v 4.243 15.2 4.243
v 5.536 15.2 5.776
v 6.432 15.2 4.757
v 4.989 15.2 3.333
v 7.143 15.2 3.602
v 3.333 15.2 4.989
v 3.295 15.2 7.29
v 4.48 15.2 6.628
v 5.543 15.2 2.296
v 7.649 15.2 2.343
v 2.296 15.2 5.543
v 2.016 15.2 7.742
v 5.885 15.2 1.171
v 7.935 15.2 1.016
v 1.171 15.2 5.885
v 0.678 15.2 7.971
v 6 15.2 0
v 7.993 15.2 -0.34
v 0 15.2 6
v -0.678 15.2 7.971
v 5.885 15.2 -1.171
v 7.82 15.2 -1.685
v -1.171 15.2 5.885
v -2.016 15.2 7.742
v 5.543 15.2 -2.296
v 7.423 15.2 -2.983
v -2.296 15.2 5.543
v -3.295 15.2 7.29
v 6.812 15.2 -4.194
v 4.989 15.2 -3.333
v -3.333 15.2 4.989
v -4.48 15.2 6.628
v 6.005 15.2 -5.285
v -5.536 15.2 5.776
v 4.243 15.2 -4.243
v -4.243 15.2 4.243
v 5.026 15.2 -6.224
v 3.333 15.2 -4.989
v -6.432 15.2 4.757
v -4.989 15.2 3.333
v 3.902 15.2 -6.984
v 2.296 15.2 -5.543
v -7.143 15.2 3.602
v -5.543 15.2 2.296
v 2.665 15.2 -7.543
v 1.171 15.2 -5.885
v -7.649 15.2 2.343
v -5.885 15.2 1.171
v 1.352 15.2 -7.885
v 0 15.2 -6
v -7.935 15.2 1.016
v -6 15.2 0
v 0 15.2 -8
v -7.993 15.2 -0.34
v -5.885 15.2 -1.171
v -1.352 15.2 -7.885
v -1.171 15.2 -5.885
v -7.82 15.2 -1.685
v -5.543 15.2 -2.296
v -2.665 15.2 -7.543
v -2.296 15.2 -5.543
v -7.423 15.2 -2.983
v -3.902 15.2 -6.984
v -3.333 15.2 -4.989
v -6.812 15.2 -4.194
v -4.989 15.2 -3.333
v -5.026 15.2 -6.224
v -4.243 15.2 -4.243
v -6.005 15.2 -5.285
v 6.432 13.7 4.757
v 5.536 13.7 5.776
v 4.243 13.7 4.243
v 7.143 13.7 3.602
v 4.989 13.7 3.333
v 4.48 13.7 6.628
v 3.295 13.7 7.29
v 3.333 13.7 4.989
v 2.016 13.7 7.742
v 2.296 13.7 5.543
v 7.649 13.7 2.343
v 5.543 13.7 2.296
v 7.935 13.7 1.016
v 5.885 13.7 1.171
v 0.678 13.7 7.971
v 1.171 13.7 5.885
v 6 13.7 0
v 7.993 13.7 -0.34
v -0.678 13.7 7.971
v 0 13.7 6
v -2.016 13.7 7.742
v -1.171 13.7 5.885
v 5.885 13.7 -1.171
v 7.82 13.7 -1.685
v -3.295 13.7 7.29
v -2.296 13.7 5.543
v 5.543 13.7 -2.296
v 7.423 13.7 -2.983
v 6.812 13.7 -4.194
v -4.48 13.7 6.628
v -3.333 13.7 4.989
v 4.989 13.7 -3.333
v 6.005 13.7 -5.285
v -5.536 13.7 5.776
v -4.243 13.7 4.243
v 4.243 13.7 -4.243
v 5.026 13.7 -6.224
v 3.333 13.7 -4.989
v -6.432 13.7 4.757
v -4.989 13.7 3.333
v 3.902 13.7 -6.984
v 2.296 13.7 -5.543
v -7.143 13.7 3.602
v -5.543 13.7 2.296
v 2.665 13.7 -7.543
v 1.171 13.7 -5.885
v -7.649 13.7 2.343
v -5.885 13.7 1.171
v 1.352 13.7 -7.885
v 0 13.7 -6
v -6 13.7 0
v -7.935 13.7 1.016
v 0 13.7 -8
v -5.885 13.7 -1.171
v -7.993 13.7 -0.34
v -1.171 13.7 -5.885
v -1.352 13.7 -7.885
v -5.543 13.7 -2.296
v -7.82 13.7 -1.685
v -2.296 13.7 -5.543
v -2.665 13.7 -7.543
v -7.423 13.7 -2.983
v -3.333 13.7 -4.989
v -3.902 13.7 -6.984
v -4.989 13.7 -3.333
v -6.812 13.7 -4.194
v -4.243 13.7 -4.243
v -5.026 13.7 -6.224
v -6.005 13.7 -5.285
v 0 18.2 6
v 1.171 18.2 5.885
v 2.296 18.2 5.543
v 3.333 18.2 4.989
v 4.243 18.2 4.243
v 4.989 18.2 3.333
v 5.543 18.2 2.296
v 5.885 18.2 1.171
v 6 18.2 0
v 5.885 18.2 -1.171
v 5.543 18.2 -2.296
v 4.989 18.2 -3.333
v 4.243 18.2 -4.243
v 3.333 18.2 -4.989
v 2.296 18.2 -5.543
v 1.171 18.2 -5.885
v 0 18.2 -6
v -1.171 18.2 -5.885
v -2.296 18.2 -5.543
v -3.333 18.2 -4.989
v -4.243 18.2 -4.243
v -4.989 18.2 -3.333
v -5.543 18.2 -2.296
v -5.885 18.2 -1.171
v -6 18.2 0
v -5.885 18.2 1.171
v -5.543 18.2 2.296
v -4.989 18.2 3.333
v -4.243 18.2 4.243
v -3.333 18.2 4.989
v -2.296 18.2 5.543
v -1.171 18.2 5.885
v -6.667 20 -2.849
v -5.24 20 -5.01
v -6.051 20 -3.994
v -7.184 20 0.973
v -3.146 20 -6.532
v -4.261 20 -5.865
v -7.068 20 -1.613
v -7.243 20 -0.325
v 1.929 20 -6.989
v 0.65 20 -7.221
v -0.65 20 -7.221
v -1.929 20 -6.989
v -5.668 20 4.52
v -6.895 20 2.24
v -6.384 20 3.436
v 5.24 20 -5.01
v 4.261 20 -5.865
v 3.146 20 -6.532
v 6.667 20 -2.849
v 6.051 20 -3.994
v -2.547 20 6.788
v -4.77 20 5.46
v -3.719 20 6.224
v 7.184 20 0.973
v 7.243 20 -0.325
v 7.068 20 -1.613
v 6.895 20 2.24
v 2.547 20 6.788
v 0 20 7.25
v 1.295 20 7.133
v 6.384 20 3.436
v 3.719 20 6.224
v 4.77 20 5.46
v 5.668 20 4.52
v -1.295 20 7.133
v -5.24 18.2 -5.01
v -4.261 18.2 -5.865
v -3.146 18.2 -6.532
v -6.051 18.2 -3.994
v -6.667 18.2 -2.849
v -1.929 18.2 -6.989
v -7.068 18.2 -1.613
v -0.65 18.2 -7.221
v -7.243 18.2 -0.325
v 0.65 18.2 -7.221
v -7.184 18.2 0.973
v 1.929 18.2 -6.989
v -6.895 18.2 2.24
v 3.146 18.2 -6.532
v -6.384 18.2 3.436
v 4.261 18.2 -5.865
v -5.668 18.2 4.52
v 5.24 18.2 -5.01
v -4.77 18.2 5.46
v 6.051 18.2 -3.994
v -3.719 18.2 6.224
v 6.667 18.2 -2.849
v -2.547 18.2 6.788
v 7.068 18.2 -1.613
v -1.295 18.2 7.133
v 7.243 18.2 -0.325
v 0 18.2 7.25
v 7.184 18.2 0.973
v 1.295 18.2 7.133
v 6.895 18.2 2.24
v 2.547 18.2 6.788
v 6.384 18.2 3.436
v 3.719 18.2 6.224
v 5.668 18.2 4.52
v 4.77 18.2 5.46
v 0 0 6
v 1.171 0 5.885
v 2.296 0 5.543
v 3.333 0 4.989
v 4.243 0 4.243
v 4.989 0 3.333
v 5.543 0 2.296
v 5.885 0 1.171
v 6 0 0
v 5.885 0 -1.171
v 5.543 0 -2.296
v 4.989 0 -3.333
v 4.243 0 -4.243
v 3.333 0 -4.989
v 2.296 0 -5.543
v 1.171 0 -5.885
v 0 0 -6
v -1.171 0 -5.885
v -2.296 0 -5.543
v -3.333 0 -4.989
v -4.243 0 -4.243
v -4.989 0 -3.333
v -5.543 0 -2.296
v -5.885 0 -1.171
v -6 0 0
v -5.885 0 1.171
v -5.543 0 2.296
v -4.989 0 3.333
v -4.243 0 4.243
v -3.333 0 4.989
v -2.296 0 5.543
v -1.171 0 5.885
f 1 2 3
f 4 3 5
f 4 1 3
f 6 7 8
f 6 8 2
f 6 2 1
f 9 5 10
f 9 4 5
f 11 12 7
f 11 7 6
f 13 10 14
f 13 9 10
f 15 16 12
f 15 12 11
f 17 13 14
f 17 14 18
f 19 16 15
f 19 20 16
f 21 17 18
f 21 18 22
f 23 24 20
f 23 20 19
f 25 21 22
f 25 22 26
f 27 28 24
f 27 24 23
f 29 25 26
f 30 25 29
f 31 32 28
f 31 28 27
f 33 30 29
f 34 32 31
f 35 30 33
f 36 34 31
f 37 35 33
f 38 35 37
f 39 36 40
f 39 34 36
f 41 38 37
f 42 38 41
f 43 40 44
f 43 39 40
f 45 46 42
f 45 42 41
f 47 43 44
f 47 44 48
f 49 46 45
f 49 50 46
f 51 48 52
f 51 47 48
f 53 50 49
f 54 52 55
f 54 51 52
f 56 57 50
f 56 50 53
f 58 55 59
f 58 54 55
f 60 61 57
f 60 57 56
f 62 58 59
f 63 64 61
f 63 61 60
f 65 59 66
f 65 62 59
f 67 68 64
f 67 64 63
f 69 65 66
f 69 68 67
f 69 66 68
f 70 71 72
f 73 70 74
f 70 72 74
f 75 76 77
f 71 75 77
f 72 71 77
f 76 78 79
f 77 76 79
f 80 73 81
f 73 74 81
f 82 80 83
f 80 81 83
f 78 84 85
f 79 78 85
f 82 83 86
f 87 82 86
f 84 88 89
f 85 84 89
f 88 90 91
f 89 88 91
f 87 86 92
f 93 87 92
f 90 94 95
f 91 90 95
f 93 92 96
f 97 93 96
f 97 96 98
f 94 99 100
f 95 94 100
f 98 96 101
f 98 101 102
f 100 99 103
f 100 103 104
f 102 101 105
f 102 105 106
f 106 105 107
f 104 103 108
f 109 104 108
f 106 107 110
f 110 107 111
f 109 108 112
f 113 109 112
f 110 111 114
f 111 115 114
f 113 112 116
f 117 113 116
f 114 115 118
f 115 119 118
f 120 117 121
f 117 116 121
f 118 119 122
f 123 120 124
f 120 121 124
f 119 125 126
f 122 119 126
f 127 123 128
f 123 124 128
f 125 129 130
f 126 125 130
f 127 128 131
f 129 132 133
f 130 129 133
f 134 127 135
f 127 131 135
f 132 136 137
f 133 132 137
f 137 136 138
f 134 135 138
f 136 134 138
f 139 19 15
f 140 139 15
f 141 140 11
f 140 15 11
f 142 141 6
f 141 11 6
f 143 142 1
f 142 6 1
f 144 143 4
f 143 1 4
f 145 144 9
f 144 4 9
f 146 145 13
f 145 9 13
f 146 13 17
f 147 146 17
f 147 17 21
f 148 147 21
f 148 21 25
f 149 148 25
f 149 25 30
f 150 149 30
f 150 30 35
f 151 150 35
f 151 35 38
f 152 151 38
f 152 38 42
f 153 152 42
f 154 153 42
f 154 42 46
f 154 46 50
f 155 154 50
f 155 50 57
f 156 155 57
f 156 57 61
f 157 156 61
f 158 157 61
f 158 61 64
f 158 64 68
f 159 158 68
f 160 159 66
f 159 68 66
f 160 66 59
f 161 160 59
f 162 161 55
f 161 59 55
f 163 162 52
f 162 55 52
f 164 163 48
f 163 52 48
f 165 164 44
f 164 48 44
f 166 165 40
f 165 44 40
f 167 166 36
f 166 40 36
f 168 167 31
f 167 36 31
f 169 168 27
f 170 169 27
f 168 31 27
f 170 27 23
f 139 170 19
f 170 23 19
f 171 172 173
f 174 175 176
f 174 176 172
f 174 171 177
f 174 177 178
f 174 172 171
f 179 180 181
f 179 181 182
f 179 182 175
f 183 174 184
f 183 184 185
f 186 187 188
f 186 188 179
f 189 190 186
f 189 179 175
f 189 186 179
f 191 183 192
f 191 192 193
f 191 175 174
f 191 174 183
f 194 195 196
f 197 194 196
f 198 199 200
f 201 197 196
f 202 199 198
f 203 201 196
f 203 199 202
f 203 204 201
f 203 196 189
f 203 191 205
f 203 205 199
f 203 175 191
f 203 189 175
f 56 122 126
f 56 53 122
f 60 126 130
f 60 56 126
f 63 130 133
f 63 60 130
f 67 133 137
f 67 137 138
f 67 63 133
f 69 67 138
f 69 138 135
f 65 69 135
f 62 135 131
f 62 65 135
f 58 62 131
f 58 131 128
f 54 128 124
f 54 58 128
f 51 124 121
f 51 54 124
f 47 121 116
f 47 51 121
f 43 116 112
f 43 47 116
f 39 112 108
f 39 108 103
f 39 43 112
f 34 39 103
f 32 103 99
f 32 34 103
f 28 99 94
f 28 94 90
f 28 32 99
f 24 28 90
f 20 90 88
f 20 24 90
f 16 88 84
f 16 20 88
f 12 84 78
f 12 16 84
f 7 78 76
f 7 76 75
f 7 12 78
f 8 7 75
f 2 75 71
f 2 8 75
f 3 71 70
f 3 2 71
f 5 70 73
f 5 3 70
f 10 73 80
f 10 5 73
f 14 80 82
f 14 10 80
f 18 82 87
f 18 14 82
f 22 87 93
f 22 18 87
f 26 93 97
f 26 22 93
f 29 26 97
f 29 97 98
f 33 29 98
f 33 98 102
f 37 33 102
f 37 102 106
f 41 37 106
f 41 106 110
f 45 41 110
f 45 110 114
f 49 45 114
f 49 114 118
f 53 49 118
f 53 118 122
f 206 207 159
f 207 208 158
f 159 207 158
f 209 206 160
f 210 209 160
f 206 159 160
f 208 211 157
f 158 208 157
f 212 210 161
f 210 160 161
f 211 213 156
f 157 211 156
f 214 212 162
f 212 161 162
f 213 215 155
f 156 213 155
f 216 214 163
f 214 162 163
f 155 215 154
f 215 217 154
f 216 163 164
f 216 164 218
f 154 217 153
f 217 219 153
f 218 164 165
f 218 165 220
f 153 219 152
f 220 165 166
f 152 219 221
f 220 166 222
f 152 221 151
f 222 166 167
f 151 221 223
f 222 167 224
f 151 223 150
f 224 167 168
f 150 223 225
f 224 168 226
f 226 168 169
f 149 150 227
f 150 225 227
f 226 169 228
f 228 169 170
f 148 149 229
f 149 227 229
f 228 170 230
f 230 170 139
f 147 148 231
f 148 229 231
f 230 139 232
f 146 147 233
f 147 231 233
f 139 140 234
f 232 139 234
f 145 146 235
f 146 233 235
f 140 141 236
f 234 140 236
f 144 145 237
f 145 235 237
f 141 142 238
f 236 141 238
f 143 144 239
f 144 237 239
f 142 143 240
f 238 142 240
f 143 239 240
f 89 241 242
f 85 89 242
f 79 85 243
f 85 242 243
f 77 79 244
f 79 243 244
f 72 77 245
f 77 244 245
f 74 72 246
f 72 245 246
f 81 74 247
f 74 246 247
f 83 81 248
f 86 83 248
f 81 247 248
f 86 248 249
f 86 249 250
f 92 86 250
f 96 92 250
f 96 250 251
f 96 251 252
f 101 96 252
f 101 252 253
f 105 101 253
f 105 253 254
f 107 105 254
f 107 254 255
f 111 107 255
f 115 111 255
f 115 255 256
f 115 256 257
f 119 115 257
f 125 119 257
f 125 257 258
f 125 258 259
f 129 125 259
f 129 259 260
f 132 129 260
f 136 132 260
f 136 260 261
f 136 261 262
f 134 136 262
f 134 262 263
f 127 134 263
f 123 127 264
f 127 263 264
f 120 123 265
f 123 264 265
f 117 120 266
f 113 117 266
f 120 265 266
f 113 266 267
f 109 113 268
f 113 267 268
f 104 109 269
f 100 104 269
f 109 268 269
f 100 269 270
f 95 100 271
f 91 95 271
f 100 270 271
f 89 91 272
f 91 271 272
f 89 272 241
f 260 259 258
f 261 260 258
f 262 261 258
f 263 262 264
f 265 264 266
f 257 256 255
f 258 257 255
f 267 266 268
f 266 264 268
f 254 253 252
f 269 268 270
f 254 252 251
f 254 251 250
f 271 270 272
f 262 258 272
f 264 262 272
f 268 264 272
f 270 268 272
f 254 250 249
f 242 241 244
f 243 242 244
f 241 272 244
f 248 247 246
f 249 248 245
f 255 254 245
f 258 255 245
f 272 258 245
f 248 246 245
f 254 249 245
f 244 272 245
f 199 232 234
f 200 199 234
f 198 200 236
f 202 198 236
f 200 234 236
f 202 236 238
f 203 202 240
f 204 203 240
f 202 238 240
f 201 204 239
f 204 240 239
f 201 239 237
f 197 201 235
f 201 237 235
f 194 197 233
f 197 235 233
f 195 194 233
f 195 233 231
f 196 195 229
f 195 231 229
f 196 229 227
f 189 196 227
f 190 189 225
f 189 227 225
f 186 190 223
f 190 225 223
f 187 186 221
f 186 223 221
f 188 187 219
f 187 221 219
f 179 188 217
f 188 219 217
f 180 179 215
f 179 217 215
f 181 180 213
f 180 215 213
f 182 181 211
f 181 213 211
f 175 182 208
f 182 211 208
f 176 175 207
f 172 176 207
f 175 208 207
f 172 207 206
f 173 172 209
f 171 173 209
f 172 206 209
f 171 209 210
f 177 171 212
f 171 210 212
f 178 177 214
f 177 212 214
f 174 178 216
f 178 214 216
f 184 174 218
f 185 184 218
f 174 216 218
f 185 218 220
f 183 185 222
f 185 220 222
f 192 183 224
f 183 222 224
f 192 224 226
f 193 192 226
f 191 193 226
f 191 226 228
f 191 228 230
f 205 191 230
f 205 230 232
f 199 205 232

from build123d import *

# Parameters (mm, degrees)
SKETCH_1_R      = 6
EXTRUDE_1_DEPTH = 18.2
SKETCH_2_R      = 7.25
EXTRUDE_2_DEPTH = 1.8
SKETCH_3_W      = 2
SKETCH_3_H      = 1.5


with BuildPart() as part:
    # 草图1 → 凸台-拉伸1 (new body)
    with BuildSketch(Plane(origin=(0, 0, 0), x_dir=(1, 0, 0), z_dir=(0, 1, 0))):
        with Locations(Location((0, 0, 0), (0, 0, 270))):
            Circle(SKETCH_1_R)
    extrude(amount=EXTRUDE_1_DEPTH)

    # 草图2 → 凸台-拉伸2 (add)
    with BuildSketch(Plane(origin=(0, 18.2, 0), x_dir=(1, 0, 0), z_dir=(0, 1, 0))):
        with Locations(Location((0, 0, 0), (0, 0, 270))):
            Circle(SKETCH_2_R)
    extrude(amount=EXTRUDE_2_DEPTH)

    # 草图3 → 旋转1 (revolve)
    with BuildSketch(Plane(origin=(0, 0, 0), x_dir=(0, 0, -1), z_dir=(1, 0, 0)), mode=Mode.PRIVATE) as revolve_1_sk:
        with Locations((-7, 14.45)):
            Rectangle(SKETCH_3_W, SKETCH_3_H)
    revolve(revolve_1_sk.sketch.rotate(Axis((0, 0, 0), (0, 1, 0)), 180), axis=Axis((0, 0, 0), (0, 1, 0)))


solid = part.part
